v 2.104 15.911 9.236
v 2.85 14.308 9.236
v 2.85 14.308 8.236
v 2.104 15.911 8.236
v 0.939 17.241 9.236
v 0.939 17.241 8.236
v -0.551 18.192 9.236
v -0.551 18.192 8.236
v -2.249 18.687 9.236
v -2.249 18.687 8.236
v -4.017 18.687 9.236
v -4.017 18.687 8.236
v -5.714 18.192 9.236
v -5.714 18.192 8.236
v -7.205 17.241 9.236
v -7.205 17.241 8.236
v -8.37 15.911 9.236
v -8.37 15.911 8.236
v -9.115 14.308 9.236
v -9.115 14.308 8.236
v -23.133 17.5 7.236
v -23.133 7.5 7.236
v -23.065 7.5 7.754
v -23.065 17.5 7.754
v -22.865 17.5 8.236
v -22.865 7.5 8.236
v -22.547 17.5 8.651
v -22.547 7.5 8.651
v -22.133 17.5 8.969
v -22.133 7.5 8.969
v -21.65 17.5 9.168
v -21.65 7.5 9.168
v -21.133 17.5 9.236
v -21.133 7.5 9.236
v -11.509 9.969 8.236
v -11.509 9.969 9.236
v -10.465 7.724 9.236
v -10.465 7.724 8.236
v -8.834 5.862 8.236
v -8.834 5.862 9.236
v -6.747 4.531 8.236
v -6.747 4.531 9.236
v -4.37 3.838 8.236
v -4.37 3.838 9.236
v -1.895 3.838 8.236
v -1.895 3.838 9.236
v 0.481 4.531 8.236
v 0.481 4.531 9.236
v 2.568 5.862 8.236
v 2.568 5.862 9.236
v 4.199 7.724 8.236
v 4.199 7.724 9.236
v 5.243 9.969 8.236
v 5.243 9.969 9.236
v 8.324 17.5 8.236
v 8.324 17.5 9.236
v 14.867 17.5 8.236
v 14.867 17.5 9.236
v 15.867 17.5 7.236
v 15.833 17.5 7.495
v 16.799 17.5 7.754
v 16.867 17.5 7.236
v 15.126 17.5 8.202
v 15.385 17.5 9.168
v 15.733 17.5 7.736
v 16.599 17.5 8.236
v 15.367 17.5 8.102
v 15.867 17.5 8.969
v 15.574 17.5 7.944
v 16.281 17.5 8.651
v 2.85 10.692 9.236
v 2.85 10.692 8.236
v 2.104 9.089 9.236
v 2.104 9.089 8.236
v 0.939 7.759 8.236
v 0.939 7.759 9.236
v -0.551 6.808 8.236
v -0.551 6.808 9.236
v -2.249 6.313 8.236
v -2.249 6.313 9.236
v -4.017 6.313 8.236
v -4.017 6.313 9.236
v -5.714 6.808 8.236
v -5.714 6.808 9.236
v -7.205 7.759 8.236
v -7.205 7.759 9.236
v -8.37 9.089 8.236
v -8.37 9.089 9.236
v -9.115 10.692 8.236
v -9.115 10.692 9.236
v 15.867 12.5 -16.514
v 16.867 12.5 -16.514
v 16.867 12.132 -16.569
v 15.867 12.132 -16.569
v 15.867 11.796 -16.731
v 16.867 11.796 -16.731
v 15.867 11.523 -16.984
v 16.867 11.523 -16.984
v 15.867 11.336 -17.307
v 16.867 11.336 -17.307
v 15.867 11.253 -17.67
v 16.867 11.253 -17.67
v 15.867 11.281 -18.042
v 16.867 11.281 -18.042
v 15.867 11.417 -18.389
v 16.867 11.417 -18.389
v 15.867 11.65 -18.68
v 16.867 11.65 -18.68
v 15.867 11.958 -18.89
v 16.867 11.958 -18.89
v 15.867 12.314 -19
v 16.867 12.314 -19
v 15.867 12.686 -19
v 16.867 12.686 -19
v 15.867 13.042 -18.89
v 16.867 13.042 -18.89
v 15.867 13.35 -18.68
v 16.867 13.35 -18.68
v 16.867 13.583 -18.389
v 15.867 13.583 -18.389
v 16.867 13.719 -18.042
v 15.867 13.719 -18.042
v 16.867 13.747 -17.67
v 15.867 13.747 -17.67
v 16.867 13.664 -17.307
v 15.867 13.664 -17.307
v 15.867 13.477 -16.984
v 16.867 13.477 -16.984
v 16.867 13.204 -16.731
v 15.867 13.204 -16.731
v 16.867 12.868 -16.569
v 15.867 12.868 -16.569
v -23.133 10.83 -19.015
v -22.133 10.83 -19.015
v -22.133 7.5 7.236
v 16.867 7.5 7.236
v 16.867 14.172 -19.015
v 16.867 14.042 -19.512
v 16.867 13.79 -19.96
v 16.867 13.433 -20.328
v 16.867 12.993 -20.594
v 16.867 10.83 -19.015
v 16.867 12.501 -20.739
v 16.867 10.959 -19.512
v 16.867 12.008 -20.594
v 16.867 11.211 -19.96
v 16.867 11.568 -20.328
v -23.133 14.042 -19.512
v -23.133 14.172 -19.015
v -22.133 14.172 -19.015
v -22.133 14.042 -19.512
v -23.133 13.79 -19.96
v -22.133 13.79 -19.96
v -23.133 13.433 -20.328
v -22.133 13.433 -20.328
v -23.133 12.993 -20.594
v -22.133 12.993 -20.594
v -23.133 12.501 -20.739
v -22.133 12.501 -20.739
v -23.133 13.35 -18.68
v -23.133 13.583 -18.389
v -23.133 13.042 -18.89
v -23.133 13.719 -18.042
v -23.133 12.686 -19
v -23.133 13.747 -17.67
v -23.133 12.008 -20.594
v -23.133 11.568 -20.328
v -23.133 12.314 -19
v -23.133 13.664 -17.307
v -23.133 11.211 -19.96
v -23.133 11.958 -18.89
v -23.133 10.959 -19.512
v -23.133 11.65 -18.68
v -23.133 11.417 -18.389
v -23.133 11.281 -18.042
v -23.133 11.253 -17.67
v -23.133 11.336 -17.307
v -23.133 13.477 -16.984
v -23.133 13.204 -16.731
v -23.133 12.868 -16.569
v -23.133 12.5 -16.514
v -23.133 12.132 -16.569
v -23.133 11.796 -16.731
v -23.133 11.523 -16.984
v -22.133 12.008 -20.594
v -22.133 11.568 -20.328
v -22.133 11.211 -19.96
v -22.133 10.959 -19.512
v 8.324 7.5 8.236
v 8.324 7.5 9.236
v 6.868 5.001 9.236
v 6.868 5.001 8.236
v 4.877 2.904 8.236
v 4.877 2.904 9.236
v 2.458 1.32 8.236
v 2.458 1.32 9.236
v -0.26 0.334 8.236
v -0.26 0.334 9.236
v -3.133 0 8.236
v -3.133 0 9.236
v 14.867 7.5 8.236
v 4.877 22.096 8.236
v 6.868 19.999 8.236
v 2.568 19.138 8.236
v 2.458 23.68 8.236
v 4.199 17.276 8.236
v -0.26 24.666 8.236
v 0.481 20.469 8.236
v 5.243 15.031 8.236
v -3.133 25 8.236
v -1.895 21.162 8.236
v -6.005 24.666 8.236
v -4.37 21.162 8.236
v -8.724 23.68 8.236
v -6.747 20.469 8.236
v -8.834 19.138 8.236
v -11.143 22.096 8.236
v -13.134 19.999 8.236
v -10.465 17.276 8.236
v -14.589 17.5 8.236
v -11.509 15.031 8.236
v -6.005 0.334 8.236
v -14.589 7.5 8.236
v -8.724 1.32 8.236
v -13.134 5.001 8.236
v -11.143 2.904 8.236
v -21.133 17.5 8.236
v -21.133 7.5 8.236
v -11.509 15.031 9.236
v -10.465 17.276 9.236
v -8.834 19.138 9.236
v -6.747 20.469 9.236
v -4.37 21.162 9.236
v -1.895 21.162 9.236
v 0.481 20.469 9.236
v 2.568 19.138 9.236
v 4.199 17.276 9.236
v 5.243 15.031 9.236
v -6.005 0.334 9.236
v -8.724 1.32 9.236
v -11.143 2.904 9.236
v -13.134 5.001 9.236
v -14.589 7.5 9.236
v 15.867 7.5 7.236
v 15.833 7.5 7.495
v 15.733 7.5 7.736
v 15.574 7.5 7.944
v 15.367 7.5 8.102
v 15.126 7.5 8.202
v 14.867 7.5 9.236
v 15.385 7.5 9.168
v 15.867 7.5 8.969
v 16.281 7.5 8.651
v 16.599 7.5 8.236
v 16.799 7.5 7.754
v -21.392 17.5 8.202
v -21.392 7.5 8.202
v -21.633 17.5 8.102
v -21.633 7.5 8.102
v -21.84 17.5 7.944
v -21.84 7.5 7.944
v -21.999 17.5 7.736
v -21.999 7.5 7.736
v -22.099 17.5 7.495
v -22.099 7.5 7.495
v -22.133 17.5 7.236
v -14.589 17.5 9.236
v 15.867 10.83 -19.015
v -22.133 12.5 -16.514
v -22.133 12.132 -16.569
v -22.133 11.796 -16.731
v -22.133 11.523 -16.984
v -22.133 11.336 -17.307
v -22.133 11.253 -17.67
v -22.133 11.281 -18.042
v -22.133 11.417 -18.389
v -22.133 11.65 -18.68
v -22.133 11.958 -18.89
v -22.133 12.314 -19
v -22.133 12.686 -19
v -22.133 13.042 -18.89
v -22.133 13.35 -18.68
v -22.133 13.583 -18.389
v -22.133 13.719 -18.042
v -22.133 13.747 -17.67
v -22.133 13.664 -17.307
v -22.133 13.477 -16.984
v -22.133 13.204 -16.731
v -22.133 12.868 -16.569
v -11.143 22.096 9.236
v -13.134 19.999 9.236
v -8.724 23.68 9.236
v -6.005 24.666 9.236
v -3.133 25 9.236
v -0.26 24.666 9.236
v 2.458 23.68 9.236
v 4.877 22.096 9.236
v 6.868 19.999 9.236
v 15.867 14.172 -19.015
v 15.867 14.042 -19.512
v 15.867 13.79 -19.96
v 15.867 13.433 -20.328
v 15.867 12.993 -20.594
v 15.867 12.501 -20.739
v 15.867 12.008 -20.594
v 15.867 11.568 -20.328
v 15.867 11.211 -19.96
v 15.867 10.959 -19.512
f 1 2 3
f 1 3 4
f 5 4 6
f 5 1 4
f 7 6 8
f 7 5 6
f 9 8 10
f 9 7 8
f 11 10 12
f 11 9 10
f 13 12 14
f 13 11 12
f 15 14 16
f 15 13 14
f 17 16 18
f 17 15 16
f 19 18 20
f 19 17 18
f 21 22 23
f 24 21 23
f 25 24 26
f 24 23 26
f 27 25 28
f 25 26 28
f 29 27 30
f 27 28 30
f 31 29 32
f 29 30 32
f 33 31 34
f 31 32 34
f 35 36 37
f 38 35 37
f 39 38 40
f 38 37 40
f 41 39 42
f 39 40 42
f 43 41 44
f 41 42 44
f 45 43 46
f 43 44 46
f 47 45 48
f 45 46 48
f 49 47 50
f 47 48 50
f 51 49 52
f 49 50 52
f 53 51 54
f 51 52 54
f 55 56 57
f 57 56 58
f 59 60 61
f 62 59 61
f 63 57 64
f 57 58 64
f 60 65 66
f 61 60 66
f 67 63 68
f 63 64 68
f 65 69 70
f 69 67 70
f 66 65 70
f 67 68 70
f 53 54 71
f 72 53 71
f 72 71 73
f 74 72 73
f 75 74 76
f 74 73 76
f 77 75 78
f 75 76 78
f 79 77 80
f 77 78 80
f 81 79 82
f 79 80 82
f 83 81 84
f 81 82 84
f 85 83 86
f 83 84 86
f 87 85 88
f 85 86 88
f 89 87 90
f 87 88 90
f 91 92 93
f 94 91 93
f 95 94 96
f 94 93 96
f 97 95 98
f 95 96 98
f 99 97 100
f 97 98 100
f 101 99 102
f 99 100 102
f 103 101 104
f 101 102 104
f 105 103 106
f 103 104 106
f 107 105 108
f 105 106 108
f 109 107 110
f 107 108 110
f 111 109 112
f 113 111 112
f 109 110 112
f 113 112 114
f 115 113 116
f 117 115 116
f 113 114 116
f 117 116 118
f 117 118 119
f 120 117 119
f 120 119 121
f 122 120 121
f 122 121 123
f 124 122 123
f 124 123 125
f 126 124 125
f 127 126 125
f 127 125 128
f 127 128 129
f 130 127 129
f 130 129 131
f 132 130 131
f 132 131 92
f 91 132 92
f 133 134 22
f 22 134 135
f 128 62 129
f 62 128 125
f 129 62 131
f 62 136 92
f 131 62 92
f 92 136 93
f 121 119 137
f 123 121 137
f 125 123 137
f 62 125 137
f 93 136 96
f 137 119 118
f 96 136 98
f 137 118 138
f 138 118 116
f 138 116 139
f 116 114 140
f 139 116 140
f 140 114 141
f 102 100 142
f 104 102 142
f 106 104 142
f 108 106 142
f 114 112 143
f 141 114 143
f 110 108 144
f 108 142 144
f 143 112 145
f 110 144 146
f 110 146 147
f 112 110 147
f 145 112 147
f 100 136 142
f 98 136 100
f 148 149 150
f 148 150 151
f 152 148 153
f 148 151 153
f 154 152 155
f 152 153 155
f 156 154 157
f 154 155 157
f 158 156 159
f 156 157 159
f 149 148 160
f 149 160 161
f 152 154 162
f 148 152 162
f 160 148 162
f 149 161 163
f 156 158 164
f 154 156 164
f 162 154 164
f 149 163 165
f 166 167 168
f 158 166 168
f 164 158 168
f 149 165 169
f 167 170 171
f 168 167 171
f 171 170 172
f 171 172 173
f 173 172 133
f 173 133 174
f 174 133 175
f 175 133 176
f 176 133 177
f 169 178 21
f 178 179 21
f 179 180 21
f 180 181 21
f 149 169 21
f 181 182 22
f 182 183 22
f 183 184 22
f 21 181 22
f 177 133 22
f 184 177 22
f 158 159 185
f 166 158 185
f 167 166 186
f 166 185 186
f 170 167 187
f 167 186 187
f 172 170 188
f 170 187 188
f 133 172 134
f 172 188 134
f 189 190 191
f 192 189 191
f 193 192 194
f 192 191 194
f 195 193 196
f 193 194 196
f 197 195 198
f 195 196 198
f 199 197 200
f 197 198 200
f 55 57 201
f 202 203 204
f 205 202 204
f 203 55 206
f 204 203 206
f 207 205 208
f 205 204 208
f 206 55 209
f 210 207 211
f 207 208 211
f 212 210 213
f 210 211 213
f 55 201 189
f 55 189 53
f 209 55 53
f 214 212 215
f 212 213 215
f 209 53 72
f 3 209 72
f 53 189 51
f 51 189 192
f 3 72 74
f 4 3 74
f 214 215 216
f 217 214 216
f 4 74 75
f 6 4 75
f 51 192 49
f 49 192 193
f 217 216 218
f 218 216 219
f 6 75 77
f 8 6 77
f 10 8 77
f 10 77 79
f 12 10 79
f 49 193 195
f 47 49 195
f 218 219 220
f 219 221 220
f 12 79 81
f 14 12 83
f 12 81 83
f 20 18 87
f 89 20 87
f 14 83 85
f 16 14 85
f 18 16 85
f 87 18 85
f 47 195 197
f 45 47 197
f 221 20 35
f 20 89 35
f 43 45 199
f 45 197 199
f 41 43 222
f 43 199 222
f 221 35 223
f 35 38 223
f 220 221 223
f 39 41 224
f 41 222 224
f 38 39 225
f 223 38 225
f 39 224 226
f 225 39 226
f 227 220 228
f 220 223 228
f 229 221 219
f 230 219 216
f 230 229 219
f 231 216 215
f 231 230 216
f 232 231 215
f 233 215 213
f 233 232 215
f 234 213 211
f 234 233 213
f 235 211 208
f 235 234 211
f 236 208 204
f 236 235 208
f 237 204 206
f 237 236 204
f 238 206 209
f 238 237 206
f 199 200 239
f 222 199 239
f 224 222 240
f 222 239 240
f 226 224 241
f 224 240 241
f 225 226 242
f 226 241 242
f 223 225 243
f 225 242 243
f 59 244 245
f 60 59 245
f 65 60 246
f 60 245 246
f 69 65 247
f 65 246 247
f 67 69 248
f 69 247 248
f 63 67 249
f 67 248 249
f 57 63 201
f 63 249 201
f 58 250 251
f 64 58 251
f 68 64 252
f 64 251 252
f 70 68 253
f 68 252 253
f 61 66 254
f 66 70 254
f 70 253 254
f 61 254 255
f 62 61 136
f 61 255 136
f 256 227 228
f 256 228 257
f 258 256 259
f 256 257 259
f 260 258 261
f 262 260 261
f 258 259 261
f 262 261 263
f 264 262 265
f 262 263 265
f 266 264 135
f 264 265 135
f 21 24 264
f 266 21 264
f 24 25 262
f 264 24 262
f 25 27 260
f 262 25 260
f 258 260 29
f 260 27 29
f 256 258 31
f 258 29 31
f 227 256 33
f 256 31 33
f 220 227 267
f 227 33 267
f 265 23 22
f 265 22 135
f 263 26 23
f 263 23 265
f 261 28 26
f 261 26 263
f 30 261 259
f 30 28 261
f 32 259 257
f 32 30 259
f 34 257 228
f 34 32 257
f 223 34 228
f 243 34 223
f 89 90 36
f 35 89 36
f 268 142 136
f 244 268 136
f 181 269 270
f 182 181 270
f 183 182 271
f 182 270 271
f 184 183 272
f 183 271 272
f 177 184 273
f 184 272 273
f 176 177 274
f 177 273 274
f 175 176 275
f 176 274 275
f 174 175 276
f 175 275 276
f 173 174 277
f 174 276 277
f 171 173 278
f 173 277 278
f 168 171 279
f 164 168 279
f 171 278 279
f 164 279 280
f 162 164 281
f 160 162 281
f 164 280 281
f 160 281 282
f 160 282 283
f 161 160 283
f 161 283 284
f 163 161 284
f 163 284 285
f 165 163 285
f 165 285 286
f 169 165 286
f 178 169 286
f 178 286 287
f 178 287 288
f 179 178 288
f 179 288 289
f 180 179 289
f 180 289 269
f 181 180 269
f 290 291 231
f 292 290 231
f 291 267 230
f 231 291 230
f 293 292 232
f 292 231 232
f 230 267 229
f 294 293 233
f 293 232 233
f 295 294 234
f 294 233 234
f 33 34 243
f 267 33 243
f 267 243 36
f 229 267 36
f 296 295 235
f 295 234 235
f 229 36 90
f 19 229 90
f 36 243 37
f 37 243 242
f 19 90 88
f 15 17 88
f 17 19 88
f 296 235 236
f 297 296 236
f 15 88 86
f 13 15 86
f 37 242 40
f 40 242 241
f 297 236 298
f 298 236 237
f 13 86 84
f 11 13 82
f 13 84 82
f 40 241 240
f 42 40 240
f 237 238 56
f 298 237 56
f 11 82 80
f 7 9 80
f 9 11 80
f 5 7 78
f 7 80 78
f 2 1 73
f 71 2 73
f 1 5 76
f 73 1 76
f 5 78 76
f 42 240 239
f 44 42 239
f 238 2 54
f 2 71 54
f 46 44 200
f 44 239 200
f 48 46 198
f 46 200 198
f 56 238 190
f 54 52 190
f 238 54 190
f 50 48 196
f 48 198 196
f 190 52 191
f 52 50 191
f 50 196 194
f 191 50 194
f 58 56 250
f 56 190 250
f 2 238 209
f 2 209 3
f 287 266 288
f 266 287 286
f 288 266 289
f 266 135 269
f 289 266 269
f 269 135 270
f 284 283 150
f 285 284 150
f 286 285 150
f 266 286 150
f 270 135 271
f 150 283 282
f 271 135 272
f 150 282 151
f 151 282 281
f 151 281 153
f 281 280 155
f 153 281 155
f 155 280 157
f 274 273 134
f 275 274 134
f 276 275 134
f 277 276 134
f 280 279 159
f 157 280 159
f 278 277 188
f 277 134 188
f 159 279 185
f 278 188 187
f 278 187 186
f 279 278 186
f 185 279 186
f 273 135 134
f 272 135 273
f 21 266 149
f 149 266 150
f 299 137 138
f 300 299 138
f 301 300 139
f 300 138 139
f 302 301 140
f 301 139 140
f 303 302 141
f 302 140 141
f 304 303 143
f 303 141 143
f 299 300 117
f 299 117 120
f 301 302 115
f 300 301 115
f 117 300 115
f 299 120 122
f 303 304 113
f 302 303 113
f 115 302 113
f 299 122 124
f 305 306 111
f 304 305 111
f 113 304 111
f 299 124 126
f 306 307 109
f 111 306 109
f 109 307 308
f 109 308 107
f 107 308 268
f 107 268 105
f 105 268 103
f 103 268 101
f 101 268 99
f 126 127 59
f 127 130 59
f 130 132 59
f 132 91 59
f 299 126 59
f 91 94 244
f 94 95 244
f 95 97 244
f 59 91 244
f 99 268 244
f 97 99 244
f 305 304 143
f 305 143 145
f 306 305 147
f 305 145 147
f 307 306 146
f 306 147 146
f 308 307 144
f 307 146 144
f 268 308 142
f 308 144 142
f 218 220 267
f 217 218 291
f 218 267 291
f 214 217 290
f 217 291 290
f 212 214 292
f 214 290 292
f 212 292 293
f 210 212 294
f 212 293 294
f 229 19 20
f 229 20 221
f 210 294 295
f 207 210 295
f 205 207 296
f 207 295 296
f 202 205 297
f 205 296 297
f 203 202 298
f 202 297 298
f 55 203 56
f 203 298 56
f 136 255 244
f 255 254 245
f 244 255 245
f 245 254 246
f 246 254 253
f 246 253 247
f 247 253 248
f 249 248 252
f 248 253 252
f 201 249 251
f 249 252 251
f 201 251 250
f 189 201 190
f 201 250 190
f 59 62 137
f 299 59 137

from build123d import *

# Parameters (mm, degrees)
SM_BASE_FLANGE_1_DEPTH = 25
CUT_EXTRUDE_2_REACH    = 47.389
SKETCH_7_W             = 2
SKETCH_7_H             = 7.5
CUT_EXTRUDE_3_REACH    = 53.538
SKETCH_8_R             = 1.25
FILLET_1_R             = 2
CUT_EXTRUDE_4_DEPTH    = 10


# Sheet-metal steps are written as plain solids
with BuildPart() as part:
    # Sketch 1 → 基体-法兰1 (new body)
    with BuildSketch(Plane(origin=(0, 0, 0), x_dir=(1, 0, 0), z_dir=(0, 1, 0))):
        with BuildLine():
            Line((-23.132778959, 20.763530703), (-23.132778959, -7.236469297))
            ThreePointArc((-23.132778959, -7.236469297), (-22.546992522, -8.650682859), (-21.132778959, -9.236469297))
            Line((-21.132778959, -9.236469297), (14.867221041, -9.236469297))
            ThreePointArc((14.867221041, -9.236469297), (16.281434603, -8.650682859), (16.867221041, -7.236469297))
            Line((16.867221041, -7.236469297), (16.867221041, 20.763530703))
            Line((16.867221041, 20.763530703), (15.867221041, 20.763530703))
            Line((15.867221041, 20.763530703), (15.867221041, -7.236469297))
            ThreePointArc((15.867221041, -7.236469297), (15.574327822, -7.943576078), (14.867221041, -8.236469297))
            Line((14.867221041, -8.236469297), (-21.132778959, -8.236469297))
            ThreePointArc((-21.132778959, -8.236469297), (-21.839885741, -7.943576078), (-22.132778959, -7.236469297))
            Line((-22.132778959, -7.236469297), (-22.132778959, 20.763530703))
            Line((-22.132778959, 20.763530703), (-23.132778959, 20.763530703))
        make_face()
    extrude(amount=SM_BASE_FLANGE_1_DEPTH)

    # 切除-拉伸2: up to this face of the body (flat: up to its plane)
    cut_extrude_2_end = Plane(part.part.faces().sort_by_distance((-22.632778959, 12.5, -20.763530703))[0])
    # 草图7 → 切除-拉伸2 (cut, up to the picked face)
    with BuildSketch(Plane.XY.offset(9.236469297), mode=Mode.PRIVATE) as cut_extrude_2_sk1:
        with BuildLine():
            Line((-21.132778959, 25), (-21.132778959, 17.5))
            Line((-21.132778959, 17.5), (-14.589218197, 17.5))
            ThreePointArc((-14.589218197, 17.5), (-9.979310906, 22.958250346), (-3.132778905, 25))
            Line((-3.132778905, 25), (-21.132778959, 25))
        make_face()
    cut_extrude_2_tool1 = split(extrude(cut_extrude_2_sk1.sketch, amount=-CUT_EXTRUDE_2_REACH, mode=Mode.PRIVATE), bisect_by=cut_extrude_2_end, keep=Keep.BOTH, mode=Mode.PRIVATE)
    # 草图7 → 切除-拉伸2 (cut, up to the picked face)
    with BuildSketch(Plane.XY.offset(9.236469297), mode=Mode.PRIVATE) as cut_extrude_2_sk2:
        with Locations((-22.132778959, 21.25)):
            Rectangle(SKETCH_7_W, SKETCH_7_H)
    cut_extrude_2_tool2 = split(extrude(cut_extrude_2_sk2.sketch, amount=-CUT_EXTRUDE_2_REACH, mode=Mode.PRIVATE), bisect_by=cut_extrude_2_end, keep=Keep.BOTH, mode=Mode.PRIVATE)
    # 草图7 → 切除-拉伸2 (cut, up to the picked face)
    with BuildSketch(Plane.XY.offset(9.236469297), mode=Mode.PRIVATE) as cut_extrude_2_sk3:
        with BuildLine():
            Line((14.867221041, 25), (-3.132778905, 25))
            ThreePointArc((-3.132778905, 25), (3.713753032, 22.958250317), (8.323660278, 17.5))
            Line((8.323660278, 17.5), (14.867221041, 17.5))
            Line((14.867221041, 17.5), (14.867221041, 25))
        make_face()
    cut_extrude_2_tool3 = split(extrude(cut_extrude_2_sk3.sketch, amount=-CUT_EXTRUDE_2_REACH, mode=Mode.PRIVATE), bisect_by=cut_extrude_2_end, keep=Keep.BOTH, mode=Mode.PRIVATE)
    # 草图7 → 切除-拉伸2 (cut, up to the picked face)
    with BuildSketch(Plane.XY.offset(9.236469297), mode=Mode.PRIVATE) as cut_extrude_2_sk4:
        with Locations((15.867221041, 21.25)):
            Rectangle(SKETCH_7_W, SKETCH_7_H)
    cut_extrude_2_tool4 = split(extrude(cut_extrude_2_sk4.sketch, amount=-CUT_EXTRUDE_2_REACH, mode=Mode.PRIVATE), bisect_by=cut_extrude_2_end, keep=Keep.BOTH, mode=Mode.PRIVATE)
    # 草图7 → 切除-拉伸2 (cut, up to the picked face)
    with BuildSketch(Plane.XY.offset(9.236469297), mode=Mode.PRIVATE) as cut_extrude_2_sk5:
        with Locations((15.867221041, 3.75)):
            Rectangle(SKETCH_7_W, SKETCH_7_H)
    cut_extrude_2_tool5 = split(extrude(cut_extrude_2_sk5.sketch, amount=-CUT_EXTRUDE_2_REACH, mode=Mode.PRIVATE), bisect_by=cut_extrude_2_end, keep=Keep.BOTH, mode=Mode.PRIVATE)
    # 草图7 → 切除-拉伸2 (cut, up to the picked face)
    with BuildSketch(Plane.XY.offset(9.236469297), mode=Mode.PRIVATE) as cut_extrude_2_sk6:
        with BuildLine():
            ThreePointArc((8.323660278, 7.5), (3.713752992, 2.041749657), (-3.132779, 0))
            Line((-3.132779, 0), (14.867221041, 0))
            Line((14.867221041, 0), (14.867221041, 7.5))
            Line((14.867221041, 7.5), (8.323660278, 7.5))
        make_face()
    cut_extrude_2_tool6 = split(extrude(cut_extrude_2_sk6.sketch, amount=-CUT_EXTRUDE_2_REACH, mode=Mode.PRIVATE), bisect_by=cut_extrude_2_end, keep=Keep.BOTH, mode=Mode.PRIVATE)
    # 草图7 → 切除-拉伸2 (cut, up to the picked face)
    with BuildSketch(Plane.XY.offset(9.236469297), mode=Mode.PRIVATE) as cut_extrude_2_sk7:
        with BuildLine():
            Line((-14.589218197, 7.5), (-21.132778959, 7.5))
            Line((-21.132778959, 7.5), (-21.132778959, 0))
            Line((-21.132778959, 0), (-3.132779, 0))
            ThreePointArc((-3.132779, 0), (-9.979310945, 2.041749679), (-14.589218197, 7.5))
        make_face()
    cut_extrude_2_tool7 = split(extrude(cut_extrude_2_sk7.sketch, amount=-CUT_EXTRUDE_2_REACH, mode=Mode.PRIVATE), bisect_by=cut_extrude_2_end, keep=Keep.BOTH, mode=Mode.PRIVATE)
    # 草图7 → 切除-拉伸2 (cut, up to the picked face)
    with BuildSketch(Plane.XY.offset(9.236469297), mode=Mode.PRIVATE) as cut_extrude_2_sk8:
        with Locations((-22.132778959, 3.75)):
            Rectangle(SKETCH_7_W, SKETCH_7_H)
    cut_extrude_2_tool8 = split(extrude(cut_extrude_2_sk8.sketch, amount=-CUT_EXTRUDE_2_REACH, mode=Mode.PRIVATE), bisect_by=cut_extrude_2_end, keep=Keep.BOTH, mode=Mode.PRIVATE)
    add(cut_extrude_2_tool1.solids().sort_by(Axis((-15.911203, 21.806262, 9.236469), (0, 0, -1)))[0], mode=Mode.SUBTRACT)
    add(cut_extrude_2_tool2.solids().sort_by(Axis((-22.132779, 21.25, 9.236469), (0, 0, -1)))[0], mode=Mode.SUBTRACT)
    add(cut_extrude_2_tool3.solids().sort_by(Axis((9.645646, 21.806262, 9.236469), (0, 0, -1)))[0], mode=Mode.SUBTRACT)
    add(cut_extrude_2_tool4.solids().sort_by(Axis((15.867221, 21.25, 9.236469), (0, 0, -1)))[0], mode=Mode.SUBTRACT)
    add(cut_extrude_2_tool5.solids().sort_by(Axis((15.867221, 3.75, 9.236469), (0, 0, -1)))[0], mode=Mode.SUBTRACT)
    add(cut_extrude_2_tool6.solids().sort_by(Axis((9.645646, 3.193738, 9.236469), (0, 0, -1)))[0], mode=Mode.SUBTRACT)
    add(cut_extrude_2_tool7.solids().sort_by(Axis((-15.911203, 3.193738, 9.236469), (0, 0, -1)))[0], mode=Mode.SUBTRACT)
    add(cut_extrude_2_tool8.solids().sort_by(Axis((-22.132779, 3.75, 9.236469), (0, 0, -1)))[0], mode=Mode.SUBTRACT)

    # 切除-拉伸3: up to this face of the body (flat: up to its plane)
    cut_extrude_3_end = Plane(part.part.faces().sort_by_distance((-23.132778959, 12.5, -6.763530703))[0])
    # 草图8 → 切除-拉伸3 (cut, up to the picked face)
    with BuildSketch(Plane(origin=(16.867221041, 0, 0), x_dir=(0, 0, -1), z_dir=(1, 0, 0)), mode=Mode.PRIVATE) as cut_extrude_3_sk1:
        Polygon((20.763530703, 17.5), (-7.236469297, 17.5), (20.763530703, 13.95), align=None)
    cut_extrude_3_tool1 = split(extrude(cut_extrude_3_sk1.sketch, amount=-CUT_EXTRUDE_3_REACH, mode=Mode.PRIVATE), bisect_by=cut_extrude_3_end, keep=Keep.BOTH, mode=Mode.PRIVATE)
    # 草图8 → 切除-拉伸3 (cut, up to the picked face)
    with BuildSketch(Plane(origin=(16.867221041, 0, 0), x_dir=(0, 0, -1), z_dir=(1, 0, 0)), mode=Mode.PRIVATE) as cut_extrude_3_sk2:
        Polygon((20.763530703, 11.051298474), (-7.236469297, 7.5), (20.763530703, 7.5), align=None)
    cut_extrude_3_tool2 = split(extrude(cut_extrude_3_sk2.sketch, amount=-CUT_EXTRUDE_3_REACH, mode=Mode.PRIVATE), bisect_by=cut_extrude_3_end, keep=Keep.BOTH, mode=Mode.PRIVATE)
    # 草图8 → 切除-拉伸3 (cut, up to the picked face)
    with BuildSketch(Plane(origin=(16.867221041, 0, 0), x_dir=(0, 0, -1), z_dir=(1, 0, 0)), mode=Mode.PRIVATE) as cut_extrude_3_sk3:
        with Locations(Location((17.763530703, 12.5, 0), (0, 0, 180))):
            Circle(SKETCH_8_R)
    cut_extrude_3_tool3 = split(extrude(cut_extrude_3_sk3.sketch, amount=-CUT_EXTRUDE_3_REACH, mode=Mode.PRIVATE), bisect_by=cut_extrude_3_end, keep=Keep.BOTH, mode=Mode.PRIVATE)
    add(cut_extrude_3_tool1.solids().sort_by(Axis((16.867221, 16.316667, -11.430197), (-1, 0, 0)))[0], mode=Mode.SUBTRACT)
    add(cut_extrude_3_tool2.solids().sort_by(Axis((16.867221, 8.683766, -11.430197), (-1, 0, 0)))[0], mode=Mode.SUBTRACT)
    add(cut_extrude_3_tool3.solids().sort_by(Axis((16.867221, 12.5, -17.763531), (-1, 0, 0)))[0], mode=Mode.SUBTRACT)

    # 圆角1
    # the kernel refuses this fillet: 2 mm, written as the material it takes off along each edge
    with BuildSketch(Plane(origin=(-17.726883899, 11.051298474, -20.763530703), x_dir=(0, -0.12582409885038226, 0.9920525672304312), z_dir=(-1, 0, 0)), Plane(origin=(21.273116101, 11.051298474, -20.763530703), x_dir=(0, -0.12582409885038226, 0.9920525672304312), z_dir=(-1, 0, 0))) as fillet_1_piece_1:
        with BuildLine():
            CenterArc((FILLET_1_R * 0.881179012106, FILLET_1_R), FILLET_1_R, 187.228348929, 82.771651071)
            Line((-FILLET_1_R * 0.110873555124, FILLET_1_R * 0.87417590115), (0, 0))
            Line((0, 0), (FILLET_1_R * 0.881179012106, 0))
        make_face()
    extrude(amount=9.811790121, mode=Mode.SUBTRACT)
    with BuildSketch(Plane(origin=(-17.726681198, 13.95, -20.763530703), x_dir=(0, -1, 0), z_dir=(-1, 0, 0))) as fillet_1_piece_2:
        with BuildLine():
            CenterArc((FILLET_1_R * 0.881219552242, FILLET_1_R), FILLET_1_R, 187.225733942, 82.774266058)
            Line((-FILLET_1_R * 0.110838756585, FILLET_1_R * 0.874221178702), (0, 0))
            Line((0, 0), (FILLET_1_R * 0.881219552242, 0))
        make_face()
    extrude(amount=9.812195522, mode=Mode.SUBTRACT)
    with BuildSketch(Plane(origin=(21.273318802, 13.95, -20.763530703), x_dir=(0, 0.12577882129772675, 0.9920583088271347), z_dir=(-1, 0, 0))) as fillet_1_piece_3:
        with BuildLine():
            CenterArc((FILLET_1_R * 0.881219552242, -FILLET_1_R), FILLET_1_R, 90, 82.774266058)
            Line((-FILLET_1_R * 0.110838756585, -FILLET_1_R * 0.874221178702), (0, 0))
            Line((0, 0), (FILLET_1_R * 0.881219552242, 0))
        make_face()
    extrude(amount=9.812195522, mode=Mode.SUBTRACT)

    # 草图9 → 切除-拉伸4 (cut)
    with BuildSketch(Plane.XY.offset(9.236469297)):
        with BuildLine():
            ThreePointArc((2.849937878, 14.308203319), (-3.132778959, 18.75), (-9.115495797, 14.308203319))
            Line((-9.115495797, 14.308203319), (-11.508582532, 15.031484647))
            ThreePointArc((-11.508582532, 15.031484647), (-3.132778959, 21.25), (5.243024613, 15.031484647))
            Line((5.243024613, 15.031484647), (2.849937878, 14.308203319))
        make_face()
        with BuildLine():
            Line((-9.115495797, 10.691796681), (-11.508582532, 9.968515353))
            ThreePointArc((-11.508582532, 9.968515353), (-3.132778959, 3.75), (5.243024613, 9.968515353))
            Line((5.243024613, 9.968515353), (2.849937878, 10.691796681))
            ThreePointArc((2.849937878, 10.691796681), (-3.132778959, 6.25), (-9.115495797, 10.691796681))
        make_face()
    extrude(amount=-CUT_EXTRUDE_4_DEPTH, mode=Mode.SUBTRACT)


solid = part.part
